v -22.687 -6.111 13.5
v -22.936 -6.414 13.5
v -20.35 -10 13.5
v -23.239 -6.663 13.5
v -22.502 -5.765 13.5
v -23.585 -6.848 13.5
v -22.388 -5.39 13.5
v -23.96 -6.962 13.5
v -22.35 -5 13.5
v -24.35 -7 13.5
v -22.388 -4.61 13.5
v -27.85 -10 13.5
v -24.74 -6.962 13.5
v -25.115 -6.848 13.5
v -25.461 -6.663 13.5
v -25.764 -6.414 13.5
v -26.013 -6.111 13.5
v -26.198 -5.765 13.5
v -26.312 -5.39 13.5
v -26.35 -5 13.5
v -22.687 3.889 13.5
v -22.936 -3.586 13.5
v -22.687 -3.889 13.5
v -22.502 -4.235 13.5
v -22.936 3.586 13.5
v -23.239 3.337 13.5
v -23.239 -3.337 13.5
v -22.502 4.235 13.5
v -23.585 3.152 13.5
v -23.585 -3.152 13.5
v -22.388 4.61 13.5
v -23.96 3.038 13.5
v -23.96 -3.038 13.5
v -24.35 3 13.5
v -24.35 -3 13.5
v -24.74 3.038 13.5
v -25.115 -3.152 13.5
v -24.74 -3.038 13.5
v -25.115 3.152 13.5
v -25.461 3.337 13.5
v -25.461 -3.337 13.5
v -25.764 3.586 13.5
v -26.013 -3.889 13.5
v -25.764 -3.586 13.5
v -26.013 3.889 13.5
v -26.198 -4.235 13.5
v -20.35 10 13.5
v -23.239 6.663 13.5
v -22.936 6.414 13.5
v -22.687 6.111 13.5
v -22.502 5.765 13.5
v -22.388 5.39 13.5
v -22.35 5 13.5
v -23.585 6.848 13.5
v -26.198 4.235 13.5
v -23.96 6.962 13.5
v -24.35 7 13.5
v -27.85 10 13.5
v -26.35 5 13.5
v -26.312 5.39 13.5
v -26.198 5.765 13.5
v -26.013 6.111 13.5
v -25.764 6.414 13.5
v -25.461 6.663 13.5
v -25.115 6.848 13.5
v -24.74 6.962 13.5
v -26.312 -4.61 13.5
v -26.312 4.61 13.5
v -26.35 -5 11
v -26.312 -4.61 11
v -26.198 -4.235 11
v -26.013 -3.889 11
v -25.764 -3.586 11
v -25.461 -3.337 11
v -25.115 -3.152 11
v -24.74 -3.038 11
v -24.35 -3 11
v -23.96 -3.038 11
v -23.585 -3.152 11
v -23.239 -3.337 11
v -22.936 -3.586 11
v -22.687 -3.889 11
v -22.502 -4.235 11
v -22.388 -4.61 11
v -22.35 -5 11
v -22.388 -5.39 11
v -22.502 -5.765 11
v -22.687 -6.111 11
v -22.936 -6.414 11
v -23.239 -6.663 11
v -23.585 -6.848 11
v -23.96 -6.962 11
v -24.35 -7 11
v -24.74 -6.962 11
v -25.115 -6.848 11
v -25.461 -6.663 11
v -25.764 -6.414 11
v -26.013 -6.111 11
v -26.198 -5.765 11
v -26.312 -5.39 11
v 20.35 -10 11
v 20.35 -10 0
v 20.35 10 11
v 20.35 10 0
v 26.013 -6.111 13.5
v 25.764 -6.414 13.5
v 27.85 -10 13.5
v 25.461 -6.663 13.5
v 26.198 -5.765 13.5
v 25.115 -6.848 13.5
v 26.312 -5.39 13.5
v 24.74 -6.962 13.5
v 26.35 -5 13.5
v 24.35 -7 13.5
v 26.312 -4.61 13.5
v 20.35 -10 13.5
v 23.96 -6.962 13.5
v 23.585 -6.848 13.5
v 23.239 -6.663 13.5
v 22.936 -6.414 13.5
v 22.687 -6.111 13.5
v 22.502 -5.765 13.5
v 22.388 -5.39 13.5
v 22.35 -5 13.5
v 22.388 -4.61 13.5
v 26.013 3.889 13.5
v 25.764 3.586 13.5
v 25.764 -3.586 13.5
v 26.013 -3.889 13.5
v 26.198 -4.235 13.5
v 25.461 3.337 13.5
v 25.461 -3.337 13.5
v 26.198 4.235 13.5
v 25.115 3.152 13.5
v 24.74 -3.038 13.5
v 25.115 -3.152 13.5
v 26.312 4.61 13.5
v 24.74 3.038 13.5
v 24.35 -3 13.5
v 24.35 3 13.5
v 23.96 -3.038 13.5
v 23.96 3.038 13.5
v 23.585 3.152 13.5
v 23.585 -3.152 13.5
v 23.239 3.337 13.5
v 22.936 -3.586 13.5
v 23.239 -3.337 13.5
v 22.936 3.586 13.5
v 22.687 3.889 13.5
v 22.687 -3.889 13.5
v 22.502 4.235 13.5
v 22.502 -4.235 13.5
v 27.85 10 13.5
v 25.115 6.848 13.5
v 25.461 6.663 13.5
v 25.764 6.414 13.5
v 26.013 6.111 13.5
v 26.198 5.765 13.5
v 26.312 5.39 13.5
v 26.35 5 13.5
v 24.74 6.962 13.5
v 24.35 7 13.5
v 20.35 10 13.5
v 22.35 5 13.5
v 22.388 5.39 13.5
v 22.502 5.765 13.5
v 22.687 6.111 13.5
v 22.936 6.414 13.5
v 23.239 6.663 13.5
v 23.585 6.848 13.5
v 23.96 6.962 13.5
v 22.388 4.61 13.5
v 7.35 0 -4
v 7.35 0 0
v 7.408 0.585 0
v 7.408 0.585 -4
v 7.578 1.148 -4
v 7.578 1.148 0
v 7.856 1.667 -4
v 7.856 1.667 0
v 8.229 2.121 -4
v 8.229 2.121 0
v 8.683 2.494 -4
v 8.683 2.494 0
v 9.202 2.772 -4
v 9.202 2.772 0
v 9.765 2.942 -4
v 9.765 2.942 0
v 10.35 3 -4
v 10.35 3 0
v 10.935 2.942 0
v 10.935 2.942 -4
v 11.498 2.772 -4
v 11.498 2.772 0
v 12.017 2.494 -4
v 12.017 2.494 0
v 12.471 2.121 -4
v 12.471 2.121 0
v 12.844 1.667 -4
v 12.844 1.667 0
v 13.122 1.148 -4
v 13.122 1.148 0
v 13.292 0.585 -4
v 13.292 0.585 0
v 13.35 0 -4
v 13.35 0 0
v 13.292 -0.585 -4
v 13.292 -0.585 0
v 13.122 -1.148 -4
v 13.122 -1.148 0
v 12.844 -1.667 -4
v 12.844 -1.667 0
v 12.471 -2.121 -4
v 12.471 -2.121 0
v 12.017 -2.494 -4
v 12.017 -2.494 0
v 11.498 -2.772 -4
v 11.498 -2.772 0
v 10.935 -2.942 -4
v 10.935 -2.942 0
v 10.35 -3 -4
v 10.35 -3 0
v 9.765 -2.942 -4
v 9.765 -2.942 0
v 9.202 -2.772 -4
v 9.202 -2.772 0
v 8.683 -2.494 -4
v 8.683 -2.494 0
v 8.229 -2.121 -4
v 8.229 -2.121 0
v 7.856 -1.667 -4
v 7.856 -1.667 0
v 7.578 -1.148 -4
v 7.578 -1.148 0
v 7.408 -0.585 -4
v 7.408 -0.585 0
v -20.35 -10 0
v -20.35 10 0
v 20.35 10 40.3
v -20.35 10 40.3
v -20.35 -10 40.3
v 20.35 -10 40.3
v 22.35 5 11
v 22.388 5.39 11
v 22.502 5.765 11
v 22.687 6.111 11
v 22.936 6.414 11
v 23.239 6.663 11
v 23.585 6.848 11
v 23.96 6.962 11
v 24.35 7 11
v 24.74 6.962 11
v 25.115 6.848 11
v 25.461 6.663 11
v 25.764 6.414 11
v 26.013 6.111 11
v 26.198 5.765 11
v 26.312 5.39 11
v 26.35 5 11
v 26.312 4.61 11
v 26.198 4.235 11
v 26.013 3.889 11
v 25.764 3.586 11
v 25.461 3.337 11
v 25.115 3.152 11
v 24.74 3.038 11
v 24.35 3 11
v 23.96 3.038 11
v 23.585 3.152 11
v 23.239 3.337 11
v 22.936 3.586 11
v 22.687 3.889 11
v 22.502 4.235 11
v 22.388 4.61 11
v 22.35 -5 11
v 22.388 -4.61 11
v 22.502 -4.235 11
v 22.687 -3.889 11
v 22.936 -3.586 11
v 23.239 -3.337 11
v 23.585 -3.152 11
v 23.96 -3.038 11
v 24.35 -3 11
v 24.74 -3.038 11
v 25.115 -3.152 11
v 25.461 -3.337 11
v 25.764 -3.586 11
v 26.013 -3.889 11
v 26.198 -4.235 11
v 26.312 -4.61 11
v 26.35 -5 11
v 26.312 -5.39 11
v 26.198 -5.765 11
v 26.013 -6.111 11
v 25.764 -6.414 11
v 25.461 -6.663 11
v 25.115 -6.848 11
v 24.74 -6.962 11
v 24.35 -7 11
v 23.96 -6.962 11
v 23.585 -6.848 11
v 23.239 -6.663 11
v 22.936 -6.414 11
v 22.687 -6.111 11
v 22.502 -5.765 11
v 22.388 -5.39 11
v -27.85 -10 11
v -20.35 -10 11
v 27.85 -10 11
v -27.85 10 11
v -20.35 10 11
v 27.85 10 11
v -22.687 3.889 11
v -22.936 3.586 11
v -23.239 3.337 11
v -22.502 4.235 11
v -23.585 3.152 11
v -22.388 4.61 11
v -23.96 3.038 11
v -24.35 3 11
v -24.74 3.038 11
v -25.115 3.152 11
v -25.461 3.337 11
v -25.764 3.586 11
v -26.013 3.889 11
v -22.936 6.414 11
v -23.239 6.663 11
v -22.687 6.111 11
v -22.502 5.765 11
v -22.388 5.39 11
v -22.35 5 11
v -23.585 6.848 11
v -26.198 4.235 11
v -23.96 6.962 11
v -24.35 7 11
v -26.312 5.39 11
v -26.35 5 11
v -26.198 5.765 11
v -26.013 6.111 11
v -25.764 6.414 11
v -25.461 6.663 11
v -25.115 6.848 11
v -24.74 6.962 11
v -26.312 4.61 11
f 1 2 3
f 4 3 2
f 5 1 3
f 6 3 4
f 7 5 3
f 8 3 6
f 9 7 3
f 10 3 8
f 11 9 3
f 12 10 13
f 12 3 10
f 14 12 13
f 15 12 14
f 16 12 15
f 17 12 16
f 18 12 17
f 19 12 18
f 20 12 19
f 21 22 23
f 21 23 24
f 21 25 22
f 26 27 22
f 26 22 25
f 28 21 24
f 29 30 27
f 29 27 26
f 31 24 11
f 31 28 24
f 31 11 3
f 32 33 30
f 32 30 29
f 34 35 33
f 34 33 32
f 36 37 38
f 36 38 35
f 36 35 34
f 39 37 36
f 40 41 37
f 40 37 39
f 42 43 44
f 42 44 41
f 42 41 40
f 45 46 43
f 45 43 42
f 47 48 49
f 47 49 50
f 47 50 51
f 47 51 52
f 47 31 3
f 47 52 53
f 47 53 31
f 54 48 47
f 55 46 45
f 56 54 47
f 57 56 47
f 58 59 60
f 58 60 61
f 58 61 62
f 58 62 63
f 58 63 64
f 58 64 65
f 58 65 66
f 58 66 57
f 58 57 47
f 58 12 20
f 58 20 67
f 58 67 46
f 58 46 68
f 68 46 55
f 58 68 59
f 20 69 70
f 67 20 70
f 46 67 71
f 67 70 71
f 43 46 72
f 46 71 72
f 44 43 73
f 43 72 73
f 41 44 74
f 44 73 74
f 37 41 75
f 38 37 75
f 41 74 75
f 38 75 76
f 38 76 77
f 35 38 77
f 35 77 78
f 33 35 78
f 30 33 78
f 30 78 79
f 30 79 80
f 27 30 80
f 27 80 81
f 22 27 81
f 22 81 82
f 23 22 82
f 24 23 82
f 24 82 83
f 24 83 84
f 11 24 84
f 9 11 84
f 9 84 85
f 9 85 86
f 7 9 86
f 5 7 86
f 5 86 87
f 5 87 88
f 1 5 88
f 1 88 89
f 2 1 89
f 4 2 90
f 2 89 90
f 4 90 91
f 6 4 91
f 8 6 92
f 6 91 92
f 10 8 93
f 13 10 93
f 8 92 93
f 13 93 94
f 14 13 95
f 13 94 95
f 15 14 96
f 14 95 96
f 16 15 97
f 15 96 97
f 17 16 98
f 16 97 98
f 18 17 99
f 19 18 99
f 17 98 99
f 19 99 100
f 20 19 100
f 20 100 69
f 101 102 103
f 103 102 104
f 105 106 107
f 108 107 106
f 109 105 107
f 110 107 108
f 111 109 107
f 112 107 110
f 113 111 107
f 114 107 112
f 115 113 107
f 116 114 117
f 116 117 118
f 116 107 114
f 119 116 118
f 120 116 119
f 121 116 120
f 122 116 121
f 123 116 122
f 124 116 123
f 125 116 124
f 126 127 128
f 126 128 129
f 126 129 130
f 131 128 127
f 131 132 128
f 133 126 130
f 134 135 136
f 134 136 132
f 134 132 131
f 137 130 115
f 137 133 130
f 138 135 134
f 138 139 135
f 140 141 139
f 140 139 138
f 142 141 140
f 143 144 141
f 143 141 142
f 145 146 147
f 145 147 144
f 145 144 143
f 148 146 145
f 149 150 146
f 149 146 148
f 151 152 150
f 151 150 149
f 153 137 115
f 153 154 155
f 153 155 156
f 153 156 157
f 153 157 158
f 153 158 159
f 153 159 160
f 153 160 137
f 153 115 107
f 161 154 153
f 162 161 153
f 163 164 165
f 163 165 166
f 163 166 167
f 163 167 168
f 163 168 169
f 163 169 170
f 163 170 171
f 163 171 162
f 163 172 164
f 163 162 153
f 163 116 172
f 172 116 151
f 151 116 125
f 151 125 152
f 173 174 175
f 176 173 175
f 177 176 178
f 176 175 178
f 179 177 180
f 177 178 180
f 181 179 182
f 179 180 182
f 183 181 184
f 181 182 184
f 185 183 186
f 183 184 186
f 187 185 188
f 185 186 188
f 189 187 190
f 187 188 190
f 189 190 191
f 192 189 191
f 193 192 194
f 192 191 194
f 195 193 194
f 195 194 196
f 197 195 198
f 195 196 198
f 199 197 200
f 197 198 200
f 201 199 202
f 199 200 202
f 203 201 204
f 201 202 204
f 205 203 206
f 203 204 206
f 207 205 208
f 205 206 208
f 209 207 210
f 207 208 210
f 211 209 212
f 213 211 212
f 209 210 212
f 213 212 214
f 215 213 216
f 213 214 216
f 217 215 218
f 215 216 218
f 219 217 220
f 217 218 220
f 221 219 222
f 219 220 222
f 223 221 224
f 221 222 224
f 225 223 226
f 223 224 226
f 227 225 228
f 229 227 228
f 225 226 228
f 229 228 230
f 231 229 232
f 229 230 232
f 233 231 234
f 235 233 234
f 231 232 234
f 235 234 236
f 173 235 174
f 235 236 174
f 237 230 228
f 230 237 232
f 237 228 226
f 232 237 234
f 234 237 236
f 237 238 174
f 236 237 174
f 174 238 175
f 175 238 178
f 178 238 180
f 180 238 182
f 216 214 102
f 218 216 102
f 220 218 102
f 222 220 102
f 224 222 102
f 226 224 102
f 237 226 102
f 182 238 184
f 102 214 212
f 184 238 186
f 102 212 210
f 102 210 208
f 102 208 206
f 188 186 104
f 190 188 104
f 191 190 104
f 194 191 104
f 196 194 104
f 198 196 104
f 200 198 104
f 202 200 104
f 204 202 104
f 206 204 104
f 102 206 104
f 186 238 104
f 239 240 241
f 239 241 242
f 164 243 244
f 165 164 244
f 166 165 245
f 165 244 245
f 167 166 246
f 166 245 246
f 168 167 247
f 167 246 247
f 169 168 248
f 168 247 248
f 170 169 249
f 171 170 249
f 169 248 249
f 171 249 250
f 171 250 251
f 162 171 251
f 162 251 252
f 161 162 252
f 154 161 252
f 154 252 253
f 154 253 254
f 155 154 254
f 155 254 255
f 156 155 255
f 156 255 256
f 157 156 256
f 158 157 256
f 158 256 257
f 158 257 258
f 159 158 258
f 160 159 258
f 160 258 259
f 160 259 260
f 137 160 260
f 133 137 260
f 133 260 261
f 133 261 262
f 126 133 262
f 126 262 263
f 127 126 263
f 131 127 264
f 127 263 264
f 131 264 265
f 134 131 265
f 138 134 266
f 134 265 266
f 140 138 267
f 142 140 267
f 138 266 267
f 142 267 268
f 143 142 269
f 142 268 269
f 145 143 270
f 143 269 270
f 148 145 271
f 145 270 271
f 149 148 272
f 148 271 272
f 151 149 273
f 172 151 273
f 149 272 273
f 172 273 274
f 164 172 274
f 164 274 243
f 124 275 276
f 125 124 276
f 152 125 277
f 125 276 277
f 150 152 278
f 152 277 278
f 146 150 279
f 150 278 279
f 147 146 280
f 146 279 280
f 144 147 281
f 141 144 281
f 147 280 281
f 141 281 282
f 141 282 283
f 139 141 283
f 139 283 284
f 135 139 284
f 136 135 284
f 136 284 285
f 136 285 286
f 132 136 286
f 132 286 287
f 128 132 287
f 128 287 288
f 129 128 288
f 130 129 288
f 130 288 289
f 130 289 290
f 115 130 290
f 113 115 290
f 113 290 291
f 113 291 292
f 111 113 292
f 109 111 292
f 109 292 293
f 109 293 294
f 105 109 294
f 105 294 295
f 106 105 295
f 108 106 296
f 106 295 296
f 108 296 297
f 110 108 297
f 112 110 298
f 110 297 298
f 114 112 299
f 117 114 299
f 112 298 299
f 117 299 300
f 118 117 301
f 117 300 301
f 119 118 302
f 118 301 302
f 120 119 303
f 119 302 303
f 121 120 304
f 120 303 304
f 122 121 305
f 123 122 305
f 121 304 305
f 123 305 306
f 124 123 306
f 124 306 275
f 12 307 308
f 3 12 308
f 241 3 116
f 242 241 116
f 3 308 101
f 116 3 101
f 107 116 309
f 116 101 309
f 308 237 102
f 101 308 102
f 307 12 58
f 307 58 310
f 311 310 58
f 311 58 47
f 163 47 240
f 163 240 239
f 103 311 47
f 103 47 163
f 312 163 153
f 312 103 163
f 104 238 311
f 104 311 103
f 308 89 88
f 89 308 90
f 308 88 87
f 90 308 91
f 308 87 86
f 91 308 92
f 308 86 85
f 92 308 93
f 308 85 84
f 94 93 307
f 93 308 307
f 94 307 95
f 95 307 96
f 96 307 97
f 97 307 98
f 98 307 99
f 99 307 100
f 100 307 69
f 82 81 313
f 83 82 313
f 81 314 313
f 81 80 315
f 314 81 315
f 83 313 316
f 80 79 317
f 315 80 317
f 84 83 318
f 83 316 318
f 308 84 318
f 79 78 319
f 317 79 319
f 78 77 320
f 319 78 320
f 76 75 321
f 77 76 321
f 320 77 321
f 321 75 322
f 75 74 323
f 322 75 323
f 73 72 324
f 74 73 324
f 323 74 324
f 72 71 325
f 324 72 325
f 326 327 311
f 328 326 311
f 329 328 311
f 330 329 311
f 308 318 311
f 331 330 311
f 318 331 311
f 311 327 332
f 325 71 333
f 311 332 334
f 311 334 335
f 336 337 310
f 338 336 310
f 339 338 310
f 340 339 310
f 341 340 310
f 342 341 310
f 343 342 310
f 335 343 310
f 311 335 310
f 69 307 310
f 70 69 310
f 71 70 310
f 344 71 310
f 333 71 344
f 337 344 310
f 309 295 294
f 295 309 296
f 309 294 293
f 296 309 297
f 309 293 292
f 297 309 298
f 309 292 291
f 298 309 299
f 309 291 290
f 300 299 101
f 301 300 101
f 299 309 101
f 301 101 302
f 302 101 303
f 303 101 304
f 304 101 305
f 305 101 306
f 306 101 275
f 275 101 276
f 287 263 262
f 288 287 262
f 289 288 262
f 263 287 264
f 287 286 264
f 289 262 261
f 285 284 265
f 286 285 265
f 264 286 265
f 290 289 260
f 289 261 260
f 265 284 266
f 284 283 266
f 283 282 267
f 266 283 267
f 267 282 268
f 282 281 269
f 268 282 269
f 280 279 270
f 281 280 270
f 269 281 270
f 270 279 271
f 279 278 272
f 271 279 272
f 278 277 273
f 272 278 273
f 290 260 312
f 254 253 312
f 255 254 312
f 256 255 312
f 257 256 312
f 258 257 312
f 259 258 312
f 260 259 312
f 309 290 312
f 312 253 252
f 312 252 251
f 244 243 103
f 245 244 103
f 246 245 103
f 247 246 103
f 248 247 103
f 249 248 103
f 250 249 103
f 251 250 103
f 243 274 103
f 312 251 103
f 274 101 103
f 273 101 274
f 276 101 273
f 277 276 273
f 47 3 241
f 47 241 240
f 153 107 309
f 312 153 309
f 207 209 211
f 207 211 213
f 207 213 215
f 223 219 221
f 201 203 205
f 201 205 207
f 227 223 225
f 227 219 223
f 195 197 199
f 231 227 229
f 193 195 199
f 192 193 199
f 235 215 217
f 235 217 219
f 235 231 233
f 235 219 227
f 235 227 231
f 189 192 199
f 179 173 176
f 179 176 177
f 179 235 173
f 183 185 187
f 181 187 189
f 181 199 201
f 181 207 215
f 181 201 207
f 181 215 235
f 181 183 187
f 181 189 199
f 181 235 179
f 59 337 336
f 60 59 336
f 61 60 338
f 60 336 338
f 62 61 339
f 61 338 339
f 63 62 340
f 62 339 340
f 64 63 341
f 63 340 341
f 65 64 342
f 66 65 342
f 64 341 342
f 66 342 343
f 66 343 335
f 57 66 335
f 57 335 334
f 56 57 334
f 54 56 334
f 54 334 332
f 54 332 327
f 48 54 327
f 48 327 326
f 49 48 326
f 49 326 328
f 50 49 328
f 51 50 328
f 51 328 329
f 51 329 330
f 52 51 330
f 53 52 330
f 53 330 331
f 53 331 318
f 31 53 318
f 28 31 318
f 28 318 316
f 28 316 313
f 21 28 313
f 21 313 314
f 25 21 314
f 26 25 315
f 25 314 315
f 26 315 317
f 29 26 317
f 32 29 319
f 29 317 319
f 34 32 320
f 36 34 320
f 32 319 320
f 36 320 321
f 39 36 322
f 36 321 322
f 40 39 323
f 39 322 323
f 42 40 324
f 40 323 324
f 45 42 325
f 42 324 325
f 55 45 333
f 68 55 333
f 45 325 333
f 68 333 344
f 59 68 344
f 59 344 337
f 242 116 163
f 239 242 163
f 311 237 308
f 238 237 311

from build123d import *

# Parameters (mm, degrees)
SCHIZZO1_W                   = 40.7
SCHIZZO1_H                   = 20
ESTRUSIONE_ESTRUSIONE1_DEPTH = 40.3
SCHIZZO2_W                   = 2.5
SCHIZZO2_H                   = 20
ESTRUSIONE_ESTRUSIONE2_DEPTH = 7.5
RIPETIZIONE_A_L1_COUNT       = 2
RIPETIZIONE_A_L1_PITCH       = 48.2
SCHIZZO3_R                   = 3
ESTRUSIONE_ESTRUSIONE3_DEPTH = 4
SCHIZZO4_R                   = 2
TAGLIO_ESTRUSIONE1_DEPTH     = 10


with BuildPart() as part:
    # Schizzo1 → Estrusione-Estrusione1 (new body)
    with BuildSketch(Plane.XY):
        Rectangle(SCHIZZO1_W, SCHIZZO1_H)
    extrude(amount=ESTRUSIONE_ESTRUSIONE1_DEPTH)

    # Schizzo2 → Estrusione-Estrusione2 (add)
    with BuildSketch(Plane(origin=(20.35, 0, 0), x_dir=(0, 0, -1), z_dir=(1, 0, 0))):
        with Locations((-12.25, 0)):
            Rectangle(SCHIZZO2_W, SCHIZZO2_H)
    estrusione_estrusione2 = extrude(amount=ESTRUSIONE_ESTRUSIONE2_DEPTH)

    # Ripetizione a L1: Estrusione-Estrusione2 ×2
    with Locations(*[(-i * RIPETIZIONE_A_L1_PITCH, 0, 0) for i in range(1, RIPETIZIONE_A_L1_COUNT)]):
        add(estrusione_estrusione2)

    # Schizzo3 → Estrusione-Estrusione3 (add)
    with BuildSketch(Plane(origin=(0, 0, 0), x_dir=(-1, 0, 0), z_dir=(0, 0, -1))):
        with Locations((-10.35, 0)):
            Circle(SCHIZZO3_R)
    extrude(amount=ESTRUSIONE_ESTRUSIONE3_DEPTH)

    # Schizzo4 → Taglio-Estrusione1 (cut)
    with BuildSketch(Plane(origin=(0, 0, 11), x_dir=(-1, 0, 0), z_dir=(0, 0, -1))):
        with Locations((-24.35, 5)):
            Circle(SCHIZZO4_R)
        with Locations((-24.35, -5)):
            Circle(SCHIZZO4_R)
        with Locations((24.35, 5)):
            Circle(SCHIZZO4_R)
        with Locations((24.35, -5)):
            Circle(SCHIZZO4_R)
    extrude(amount=-TAGLIO_ESTRUSIONE1_DEPTH, mode=Mode.SUBTRACT)


solid = part.part
